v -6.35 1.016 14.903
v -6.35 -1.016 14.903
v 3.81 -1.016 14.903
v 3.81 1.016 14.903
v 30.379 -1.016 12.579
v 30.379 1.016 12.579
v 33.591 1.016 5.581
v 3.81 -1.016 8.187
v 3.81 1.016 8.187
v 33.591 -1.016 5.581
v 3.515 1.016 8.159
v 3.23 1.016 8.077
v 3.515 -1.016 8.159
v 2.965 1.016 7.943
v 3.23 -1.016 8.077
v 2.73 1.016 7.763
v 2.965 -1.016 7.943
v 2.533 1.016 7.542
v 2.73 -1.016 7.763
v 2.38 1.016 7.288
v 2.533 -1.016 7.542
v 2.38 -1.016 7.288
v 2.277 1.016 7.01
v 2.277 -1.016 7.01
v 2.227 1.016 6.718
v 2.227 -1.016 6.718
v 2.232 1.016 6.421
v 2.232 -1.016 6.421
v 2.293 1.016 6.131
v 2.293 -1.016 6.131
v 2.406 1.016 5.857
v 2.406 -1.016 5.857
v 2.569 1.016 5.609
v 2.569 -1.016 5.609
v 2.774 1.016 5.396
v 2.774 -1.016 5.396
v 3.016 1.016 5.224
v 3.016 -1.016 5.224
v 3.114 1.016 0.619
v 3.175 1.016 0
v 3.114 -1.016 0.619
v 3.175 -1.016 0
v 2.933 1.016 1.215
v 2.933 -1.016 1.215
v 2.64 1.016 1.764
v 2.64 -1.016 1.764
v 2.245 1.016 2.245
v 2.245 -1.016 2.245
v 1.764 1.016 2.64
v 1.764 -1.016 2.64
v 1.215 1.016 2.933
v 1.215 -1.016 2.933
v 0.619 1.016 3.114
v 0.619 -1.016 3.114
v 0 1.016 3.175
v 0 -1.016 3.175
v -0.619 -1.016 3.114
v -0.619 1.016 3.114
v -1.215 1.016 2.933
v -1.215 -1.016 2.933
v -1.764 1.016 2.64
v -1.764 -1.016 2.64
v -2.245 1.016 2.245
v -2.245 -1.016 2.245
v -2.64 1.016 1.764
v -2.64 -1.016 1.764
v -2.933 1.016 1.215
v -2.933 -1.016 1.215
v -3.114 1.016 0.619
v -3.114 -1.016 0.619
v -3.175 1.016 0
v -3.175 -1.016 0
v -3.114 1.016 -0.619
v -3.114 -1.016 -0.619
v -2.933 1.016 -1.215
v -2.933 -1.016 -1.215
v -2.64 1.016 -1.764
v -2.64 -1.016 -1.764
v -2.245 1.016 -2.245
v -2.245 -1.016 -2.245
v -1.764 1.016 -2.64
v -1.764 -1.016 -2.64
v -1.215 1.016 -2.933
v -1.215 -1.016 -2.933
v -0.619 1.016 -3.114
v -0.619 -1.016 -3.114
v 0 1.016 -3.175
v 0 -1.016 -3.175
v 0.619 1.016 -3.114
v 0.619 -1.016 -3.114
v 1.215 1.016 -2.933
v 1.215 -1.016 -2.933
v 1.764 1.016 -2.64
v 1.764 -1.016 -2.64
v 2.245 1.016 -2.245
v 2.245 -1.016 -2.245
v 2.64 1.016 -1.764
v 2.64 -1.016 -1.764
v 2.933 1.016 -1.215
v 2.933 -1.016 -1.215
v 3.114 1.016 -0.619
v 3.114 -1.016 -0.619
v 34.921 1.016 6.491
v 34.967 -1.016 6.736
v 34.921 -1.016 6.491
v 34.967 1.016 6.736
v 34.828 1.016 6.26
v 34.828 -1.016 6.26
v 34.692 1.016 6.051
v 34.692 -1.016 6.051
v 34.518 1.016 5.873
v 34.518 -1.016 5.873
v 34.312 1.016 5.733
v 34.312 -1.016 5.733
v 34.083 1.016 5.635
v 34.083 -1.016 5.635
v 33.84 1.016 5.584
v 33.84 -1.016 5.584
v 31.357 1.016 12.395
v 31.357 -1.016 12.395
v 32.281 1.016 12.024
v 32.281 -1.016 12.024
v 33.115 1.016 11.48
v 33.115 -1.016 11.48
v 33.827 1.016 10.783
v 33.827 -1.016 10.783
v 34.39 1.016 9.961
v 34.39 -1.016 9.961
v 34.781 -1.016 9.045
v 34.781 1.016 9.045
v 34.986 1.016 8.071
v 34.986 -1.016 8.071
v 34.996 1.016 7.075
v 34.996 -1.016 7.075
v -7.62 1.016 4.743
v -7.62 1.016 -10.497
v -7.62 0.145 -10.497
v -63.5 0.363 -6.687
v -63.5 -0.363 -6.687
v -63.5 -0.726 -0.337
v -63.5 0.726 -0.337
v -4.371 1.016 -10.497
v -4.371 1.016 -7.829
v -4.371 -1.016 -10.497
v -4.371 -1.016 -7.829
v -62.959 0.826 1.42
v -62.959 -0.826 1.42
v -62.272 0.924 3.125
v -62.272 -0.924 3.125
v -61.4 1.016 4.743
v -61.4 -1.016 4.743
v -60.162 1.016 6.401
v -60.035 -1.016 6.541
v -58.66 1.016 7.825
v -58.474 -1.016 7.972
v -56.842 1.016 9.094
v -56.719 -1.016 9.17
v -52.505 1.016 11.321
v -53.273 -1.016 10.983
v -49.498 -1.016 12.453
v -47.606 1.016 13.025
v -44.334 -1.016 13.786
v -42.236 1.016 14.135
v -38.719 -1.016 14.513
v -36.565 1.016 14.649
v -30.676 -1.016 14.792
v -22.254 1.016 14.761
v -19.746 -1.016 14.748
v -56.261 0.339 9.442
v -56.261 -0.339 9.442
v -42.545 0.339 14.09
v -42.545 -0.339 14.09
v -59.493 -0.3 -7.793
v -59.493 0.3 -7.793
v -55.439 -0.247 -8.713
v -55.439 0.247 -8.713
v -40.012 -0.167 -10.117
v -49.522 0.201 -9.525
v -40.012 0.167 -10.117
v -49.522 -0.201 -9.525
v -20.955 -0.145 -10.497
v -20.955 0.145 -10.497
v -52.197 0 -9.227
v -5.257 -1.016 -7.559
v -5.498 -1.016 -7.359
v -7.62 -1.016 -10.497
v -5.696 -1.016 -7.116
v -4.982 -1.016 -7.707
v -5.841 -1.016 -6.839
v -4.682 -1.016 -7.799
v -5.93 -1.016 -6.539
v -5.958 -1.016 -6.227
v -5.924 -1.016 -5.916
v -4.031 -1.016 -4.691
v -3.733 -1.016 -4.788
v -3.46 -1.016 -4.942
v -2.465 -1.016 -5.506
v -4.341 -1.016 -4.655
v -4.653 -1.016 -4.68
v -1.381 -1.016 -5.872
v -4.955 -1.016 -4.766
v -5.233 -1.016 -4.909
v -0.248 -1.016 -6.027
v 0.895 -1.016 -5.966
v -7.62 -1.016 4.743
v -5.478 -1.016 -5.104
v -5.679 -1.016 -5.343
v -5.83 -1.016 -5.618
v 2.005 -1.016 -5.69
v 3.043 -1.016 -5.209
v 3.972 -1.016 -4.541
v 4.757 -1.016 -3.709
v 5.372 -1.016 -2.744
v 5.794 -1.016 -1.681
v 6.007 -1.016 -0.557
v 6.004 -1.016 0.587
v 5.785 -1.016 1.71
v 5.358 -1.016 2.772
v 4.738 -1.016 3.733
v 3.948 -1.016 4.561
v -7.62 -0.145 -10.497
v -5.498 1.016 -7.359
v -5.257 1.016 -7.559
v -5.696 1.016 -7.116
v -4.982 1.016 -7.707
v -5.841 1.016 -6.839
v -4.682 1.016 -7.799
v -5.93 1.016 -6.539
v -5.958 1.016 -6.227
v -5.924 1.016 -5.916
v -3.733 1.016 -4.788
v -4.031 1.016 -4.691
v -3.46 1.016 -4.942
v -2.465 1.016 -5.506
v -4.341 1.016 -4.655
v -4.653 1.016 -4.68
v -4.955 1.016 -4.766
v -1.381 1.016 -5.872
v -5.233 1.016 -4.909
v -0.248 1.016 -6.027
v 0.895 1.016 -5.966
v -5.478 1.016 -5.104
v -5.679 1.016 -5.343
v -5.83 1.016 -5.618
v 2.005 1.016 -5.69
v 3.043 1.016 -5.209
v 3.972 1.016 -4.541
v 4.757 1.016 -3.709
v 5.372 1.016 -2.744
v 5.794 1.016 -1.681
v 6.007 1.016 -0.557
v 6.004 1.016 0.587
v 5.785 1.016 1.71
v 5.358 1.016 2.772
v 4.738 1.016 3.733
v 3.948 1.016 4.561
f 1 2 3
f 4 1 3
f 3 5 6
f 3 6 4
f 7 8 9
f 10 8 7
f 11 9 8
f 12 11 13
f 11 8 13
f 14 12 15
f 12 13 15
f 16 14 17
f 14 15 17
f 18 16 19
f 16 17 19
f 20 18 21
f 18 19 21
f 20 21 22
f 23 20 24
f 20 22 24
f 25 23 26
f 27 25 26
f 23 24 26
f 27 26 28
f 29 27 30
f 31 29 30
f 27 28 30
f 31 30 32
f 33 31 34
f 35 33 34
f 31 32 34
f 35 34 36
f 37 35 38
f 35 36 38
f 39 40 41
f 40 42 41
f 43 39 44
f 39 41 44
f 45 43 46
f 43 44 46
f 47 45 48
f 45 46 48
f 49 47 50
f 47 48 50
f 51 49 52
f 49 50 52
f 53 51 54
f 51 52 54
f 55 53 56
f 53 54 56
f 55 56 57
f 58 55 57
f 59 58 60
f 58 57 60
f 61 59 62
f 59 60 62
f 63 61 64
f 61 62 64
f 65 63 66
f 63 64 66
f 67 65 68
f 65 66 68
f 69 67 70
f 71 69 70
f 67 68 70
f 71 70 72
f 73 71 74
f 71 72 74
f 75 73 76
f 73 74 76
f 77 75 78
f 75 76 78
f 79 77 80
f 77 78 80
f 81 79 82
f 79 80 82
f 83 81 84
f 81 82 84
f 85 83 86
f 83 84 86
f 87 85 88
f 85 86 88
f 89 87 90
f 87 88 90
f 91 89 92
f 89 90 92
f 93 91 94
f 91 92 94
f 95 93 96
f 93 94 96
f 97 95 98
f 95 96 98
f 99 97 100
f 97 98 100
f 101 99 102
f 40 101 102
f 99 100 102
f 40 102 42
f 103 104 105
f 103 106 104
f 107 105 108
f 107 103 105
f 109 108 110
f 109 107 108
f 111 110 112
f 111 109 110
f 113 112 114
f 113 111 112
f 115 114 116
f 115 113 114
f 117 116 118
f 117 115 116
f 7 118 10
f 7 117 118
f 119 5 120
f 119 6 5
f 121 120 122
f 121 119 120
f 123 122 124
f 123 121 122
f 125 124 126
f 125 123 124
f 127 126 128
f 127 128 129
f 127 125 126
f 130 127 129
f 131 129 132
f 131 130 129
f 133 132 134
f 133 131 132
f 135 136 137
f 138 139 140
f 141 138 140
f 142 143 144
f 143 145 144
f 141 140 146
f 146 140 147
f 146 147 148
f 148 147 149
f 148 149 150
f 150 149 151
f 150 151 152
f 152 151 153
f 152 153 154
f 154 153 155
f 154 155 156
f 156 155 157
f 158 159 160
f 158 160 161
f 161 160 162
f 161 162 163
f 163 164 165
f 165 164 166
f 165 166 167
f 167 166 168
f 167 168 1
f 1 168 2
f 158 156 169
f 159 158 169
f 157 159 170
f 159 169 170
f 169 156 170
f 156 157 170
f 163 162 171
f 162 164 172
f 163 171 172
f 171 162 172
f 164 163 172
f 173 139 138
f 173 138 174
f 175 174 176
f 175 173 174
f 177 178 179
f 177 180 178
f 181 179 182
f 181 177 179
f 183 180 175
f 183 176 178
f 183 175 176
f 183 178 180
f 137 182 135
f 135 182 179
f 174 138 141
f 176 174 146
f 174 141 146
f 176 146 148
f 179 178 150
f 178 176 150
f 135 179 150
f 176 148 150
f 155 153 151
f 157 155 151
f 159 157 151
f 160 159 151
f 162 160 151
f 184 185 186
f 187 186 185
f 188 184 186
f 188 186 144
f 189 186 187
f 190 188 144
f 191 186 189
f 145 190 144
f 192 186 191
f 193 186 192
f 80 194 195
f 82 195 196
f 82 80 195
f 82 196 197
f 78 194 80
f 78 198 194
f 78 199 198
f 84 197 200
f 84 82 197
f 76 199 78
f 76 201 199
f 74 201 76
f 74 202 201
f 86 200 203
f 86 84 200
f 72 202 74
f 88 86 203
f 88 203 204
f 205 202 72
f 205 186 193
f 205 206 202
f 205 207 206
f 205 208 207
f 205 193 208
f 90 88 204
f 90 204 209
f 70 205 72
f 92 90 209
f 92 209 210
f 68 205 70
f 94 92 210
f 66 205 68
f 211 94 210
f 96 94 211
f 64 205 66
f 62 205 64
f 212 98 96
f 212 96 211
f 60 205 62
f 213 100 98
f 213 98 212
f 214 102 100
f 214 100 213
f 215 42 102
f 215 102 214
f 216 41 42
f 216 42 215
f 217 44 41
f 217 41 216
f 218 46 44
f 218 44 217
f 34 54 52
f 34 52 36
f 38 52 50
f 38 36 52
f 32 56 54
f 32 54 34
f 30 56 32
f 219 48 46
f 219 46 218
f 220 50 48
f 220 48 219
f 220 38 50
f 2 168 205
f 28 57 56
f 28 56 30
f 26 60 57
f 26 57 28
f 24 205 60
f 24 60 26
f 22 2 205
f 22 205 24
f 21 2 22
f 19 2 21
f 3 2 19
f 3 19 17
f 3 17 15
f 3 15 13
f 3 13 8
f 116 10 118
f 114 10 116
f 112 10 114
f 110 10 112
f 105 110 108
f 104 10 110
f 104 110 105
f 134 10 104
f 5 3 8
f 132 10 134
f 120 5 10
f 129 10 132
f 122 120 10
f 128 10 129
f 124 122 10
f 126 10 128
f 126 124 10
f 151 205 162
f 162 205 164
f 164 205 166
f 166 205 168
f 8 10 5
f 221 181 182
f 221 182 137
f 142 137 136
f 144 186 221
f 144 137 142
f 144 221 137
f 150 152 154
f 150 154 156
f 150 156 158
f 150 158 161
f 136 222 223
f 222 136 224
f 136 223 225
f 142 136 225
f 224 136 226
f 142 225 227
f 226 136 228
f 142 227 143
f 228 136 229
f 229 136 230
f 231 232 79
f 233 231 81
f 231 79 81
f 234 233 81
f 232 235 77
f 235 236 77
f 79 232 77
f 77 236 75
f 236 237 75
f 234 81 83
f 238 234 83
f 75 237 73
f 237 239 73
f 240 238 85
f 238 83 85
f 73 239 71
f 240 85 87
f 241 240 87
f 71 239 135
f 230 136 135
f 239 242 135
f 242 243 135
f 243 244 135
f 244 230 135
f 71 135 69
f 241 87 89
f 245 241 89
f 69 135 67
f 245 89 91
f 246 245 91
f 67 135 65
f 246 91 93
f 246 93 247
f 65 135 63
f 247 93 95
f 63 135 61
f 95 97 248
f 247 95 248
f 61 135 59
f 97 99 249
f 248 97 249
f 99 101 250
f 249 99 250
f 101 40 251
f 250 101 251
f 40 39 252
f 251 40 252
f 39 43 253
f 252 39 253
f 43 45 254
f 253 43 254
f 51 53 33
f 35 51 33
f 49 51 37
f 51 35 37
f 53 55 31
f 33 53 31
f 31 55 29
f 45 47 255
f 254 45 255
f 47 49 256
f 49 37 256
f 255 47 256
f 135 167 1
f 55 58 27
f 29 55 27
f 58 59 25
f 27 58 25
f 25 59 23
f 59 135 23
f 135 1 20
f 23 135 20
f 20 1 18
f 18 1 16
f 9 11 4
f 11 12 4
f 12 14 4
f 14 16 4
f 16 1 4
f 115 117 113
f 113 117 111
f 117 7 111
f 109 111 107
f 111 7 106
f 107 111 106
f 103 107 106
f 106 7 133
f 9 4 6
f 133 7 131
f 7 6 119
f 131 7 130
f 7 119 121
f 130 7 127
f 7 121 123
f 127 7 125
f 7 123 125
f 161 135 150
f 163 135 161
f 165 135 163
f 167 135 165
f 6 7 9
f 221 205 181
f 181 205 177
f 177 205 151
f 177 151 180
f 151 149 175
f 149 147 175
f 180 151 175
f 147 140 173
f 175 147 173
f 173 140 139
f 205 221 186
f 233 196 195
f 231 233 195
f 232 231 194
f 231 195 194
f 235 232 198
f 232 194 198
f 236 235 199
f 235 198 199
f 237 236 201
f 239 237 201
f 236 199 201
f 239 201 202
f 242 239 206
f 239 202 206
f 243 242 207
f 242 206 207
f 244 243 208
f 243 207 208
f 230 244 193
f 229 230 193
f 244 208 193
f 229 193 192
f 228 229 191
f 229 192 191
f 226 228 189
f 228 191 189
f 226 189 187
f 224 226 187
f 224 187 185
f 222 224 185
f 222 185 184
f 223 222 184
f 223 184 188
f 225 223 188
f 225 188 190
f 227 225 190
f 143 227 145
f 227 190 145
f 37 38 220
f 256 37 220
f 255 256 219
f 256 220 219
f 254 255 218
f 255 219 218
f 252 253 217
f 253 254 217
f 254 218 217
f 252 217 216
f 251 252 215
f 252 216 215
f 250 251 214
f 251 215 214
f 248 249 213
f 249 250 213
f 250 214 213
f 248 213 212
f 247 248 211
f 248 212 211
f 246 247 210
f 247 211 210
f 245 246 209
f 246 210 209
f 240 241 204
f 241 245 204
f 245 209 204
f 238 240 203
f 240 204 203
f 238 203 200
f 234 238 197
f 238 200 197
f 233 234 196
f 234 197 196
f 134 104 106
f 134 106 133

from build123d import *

# Parameters (mm, degrees)
F1_W      = 73.9775
F1_H      = 25.4
F2_DEPTH  = 1.016
F0_R      = 3.175
F0_R_2    = 1.5875
F3_DEPTH  = 12.7
F5_DEPTH  = 12.7
F7_DEPTH  = 25.4
F9_DEPTH  = 25.4
F11_DEPTH = 2.032
F12_R     = 5.08
F13_R     = 1.27
F15_DEPTH = 55.88


with BuildPart() as f2:
    # F1 (on Front) → F2 (new body, symmetric)
    with BuildSketch(Plane.XZ):
        with Locations((-26.51125, 2.202998161)):
            Rectangle(F1_W, F1_H)
    extrude(amount=F2_DEPTH, both=True)

    # F0 (on Front) → F3 (cut, symmetric)
    with BuildSketch(Plane.XZ):
        Circle(F0_R)
        with Locations((3.81, 6.5991135768)):
            Circle(F0_R_2)
        with Locations((-4.370652445, -6.2419385775)):
            Circle(F0_R_2)
    extrude(amount=F3_DEPTH, both=True, mode=Mode.SUBTRACT)

    # F4 (on Front) → F5 (cut, symmetric)
    with BuildSketch(Plane.XZ):
        with BuildLine():
            Line((10.4775, 14.902998161), (3.81, 14.902998161))
            Line((3.81, 14.902998161), (3.81, 6.5991135768))
            Line((3.81, 6.5991135768), (3.01625, 5.2242982483))
            ThreePointArc((3.01625, 5.2242982483), (5.0877588969, -3.2412598874), (-3.4600998523, -4.9415347072))
            Line((-3.4600998523, -4.9415347072), (-4.370652445, -6.2419385775))
            Line((-4.370652445, -6.2419385775), (-4.370652445, -10.497001839))
            Line((-4.370652445, -10.497001839), (10.4775, -10.497001839))
            Line((10.4775, -10.497001839), (10.4775, 14.902998161))
        make_face()
    extrude(amount=F5_DEPTH, both=True, mode=Mode.SUBTRACT)

    # F6 (on face) → F7 (cut)
    with BuildSketch(Plane.XZ.offset(1.016)):
        with BuildLine():
            Line((-63.5, 14.902998161), (-63.5, -0.337001839))
            add(Edge.make_bspline(
                [(-63.5, -0.337001839), (-61.9709865273, 5.3152601071), (-56.9088066681, 9.9391648672), (-40.7433982706, 16.0164172167), (-22.924024983, 14.394998161), (-6.35, 14.902998161)],
                knots=[0, 0, 0, 0, 0.2620535636, 0.5479565048, 1, 1, 1, 1], degree=3))
            Line((-6.35, 14.902998161), (-63.5, 14.902998161))
        make_face()
    extrude(amount=-F7_DEPTH, mode=Mode.SUBTRACT)

    # F8 (on face) → F9 (cut)
    with BuildSketch(Plane.XZ.offset(1.016)):
        with BuildLine():
            add(Edge.make_bspline(
                [(-63.5, -6.687001839), (-59.8332667097, -7.7129509305), (-51.8844924226, -10.1228512544), (-32.61339221, -10.3699269009), (-20.955, -10.497001839)],
                knots=[0, 0, 0, 0, 0.378376679, 1, 1, 1, 1], degree=3))
            Line((-63.5, -6.687001839), (-63.5, -10.497001839))
            Line((-63.5, -10.497001839), (-20.955, -10.497001839))
        make_face()
    extrude(amount=-F9_DEPTH, mode=Mode.SUBTRACT)

    # F10 (on face) → F11 (join, through all)
    with BuildSketch(Plane.XZ.offset(1.016)):
        Polygon((35.4391816644, 12.1358033288), (3.81, 14.902998161), (3.81, 8.1866135768), (34.8560376926, 5.4704372313), align=None)
    extrude(amount=-F11_DEPTH)

    # F12
    f12_edges = [f2.edges().sort_by_distance(p)[0] for p in [
        (35.439182, 0, 12.135803),
    ]]
    fillet(f12_edges, radius=F12_R)

    # F13
    f13_edges = [f2.edges().sort_by_distance(p)[0] for p in [
        (34.856038, 0, 5.470437),
    ]]
    fillet(f13_edges, radius=F13_R)

    # F14 (on face) → F15 (cut)
    with BuildSketch(Plane(origin=(-63.5, 0, 0), x_dir=(0, -1, 0), z_dir=(-1, 0, 0))):
        Polygon((0, -13.037001839), (-1.016, 4.742998161), (-1.016, -13.037001839), align=None)
        Polygon((1.016, 4.742998161), (0, -13.037001839), (1.016, -13.037001839), align=None)
    extrude(amount=-F15_DEPTH, mode=Mode.SUBTRACT)


solid = f2.part
